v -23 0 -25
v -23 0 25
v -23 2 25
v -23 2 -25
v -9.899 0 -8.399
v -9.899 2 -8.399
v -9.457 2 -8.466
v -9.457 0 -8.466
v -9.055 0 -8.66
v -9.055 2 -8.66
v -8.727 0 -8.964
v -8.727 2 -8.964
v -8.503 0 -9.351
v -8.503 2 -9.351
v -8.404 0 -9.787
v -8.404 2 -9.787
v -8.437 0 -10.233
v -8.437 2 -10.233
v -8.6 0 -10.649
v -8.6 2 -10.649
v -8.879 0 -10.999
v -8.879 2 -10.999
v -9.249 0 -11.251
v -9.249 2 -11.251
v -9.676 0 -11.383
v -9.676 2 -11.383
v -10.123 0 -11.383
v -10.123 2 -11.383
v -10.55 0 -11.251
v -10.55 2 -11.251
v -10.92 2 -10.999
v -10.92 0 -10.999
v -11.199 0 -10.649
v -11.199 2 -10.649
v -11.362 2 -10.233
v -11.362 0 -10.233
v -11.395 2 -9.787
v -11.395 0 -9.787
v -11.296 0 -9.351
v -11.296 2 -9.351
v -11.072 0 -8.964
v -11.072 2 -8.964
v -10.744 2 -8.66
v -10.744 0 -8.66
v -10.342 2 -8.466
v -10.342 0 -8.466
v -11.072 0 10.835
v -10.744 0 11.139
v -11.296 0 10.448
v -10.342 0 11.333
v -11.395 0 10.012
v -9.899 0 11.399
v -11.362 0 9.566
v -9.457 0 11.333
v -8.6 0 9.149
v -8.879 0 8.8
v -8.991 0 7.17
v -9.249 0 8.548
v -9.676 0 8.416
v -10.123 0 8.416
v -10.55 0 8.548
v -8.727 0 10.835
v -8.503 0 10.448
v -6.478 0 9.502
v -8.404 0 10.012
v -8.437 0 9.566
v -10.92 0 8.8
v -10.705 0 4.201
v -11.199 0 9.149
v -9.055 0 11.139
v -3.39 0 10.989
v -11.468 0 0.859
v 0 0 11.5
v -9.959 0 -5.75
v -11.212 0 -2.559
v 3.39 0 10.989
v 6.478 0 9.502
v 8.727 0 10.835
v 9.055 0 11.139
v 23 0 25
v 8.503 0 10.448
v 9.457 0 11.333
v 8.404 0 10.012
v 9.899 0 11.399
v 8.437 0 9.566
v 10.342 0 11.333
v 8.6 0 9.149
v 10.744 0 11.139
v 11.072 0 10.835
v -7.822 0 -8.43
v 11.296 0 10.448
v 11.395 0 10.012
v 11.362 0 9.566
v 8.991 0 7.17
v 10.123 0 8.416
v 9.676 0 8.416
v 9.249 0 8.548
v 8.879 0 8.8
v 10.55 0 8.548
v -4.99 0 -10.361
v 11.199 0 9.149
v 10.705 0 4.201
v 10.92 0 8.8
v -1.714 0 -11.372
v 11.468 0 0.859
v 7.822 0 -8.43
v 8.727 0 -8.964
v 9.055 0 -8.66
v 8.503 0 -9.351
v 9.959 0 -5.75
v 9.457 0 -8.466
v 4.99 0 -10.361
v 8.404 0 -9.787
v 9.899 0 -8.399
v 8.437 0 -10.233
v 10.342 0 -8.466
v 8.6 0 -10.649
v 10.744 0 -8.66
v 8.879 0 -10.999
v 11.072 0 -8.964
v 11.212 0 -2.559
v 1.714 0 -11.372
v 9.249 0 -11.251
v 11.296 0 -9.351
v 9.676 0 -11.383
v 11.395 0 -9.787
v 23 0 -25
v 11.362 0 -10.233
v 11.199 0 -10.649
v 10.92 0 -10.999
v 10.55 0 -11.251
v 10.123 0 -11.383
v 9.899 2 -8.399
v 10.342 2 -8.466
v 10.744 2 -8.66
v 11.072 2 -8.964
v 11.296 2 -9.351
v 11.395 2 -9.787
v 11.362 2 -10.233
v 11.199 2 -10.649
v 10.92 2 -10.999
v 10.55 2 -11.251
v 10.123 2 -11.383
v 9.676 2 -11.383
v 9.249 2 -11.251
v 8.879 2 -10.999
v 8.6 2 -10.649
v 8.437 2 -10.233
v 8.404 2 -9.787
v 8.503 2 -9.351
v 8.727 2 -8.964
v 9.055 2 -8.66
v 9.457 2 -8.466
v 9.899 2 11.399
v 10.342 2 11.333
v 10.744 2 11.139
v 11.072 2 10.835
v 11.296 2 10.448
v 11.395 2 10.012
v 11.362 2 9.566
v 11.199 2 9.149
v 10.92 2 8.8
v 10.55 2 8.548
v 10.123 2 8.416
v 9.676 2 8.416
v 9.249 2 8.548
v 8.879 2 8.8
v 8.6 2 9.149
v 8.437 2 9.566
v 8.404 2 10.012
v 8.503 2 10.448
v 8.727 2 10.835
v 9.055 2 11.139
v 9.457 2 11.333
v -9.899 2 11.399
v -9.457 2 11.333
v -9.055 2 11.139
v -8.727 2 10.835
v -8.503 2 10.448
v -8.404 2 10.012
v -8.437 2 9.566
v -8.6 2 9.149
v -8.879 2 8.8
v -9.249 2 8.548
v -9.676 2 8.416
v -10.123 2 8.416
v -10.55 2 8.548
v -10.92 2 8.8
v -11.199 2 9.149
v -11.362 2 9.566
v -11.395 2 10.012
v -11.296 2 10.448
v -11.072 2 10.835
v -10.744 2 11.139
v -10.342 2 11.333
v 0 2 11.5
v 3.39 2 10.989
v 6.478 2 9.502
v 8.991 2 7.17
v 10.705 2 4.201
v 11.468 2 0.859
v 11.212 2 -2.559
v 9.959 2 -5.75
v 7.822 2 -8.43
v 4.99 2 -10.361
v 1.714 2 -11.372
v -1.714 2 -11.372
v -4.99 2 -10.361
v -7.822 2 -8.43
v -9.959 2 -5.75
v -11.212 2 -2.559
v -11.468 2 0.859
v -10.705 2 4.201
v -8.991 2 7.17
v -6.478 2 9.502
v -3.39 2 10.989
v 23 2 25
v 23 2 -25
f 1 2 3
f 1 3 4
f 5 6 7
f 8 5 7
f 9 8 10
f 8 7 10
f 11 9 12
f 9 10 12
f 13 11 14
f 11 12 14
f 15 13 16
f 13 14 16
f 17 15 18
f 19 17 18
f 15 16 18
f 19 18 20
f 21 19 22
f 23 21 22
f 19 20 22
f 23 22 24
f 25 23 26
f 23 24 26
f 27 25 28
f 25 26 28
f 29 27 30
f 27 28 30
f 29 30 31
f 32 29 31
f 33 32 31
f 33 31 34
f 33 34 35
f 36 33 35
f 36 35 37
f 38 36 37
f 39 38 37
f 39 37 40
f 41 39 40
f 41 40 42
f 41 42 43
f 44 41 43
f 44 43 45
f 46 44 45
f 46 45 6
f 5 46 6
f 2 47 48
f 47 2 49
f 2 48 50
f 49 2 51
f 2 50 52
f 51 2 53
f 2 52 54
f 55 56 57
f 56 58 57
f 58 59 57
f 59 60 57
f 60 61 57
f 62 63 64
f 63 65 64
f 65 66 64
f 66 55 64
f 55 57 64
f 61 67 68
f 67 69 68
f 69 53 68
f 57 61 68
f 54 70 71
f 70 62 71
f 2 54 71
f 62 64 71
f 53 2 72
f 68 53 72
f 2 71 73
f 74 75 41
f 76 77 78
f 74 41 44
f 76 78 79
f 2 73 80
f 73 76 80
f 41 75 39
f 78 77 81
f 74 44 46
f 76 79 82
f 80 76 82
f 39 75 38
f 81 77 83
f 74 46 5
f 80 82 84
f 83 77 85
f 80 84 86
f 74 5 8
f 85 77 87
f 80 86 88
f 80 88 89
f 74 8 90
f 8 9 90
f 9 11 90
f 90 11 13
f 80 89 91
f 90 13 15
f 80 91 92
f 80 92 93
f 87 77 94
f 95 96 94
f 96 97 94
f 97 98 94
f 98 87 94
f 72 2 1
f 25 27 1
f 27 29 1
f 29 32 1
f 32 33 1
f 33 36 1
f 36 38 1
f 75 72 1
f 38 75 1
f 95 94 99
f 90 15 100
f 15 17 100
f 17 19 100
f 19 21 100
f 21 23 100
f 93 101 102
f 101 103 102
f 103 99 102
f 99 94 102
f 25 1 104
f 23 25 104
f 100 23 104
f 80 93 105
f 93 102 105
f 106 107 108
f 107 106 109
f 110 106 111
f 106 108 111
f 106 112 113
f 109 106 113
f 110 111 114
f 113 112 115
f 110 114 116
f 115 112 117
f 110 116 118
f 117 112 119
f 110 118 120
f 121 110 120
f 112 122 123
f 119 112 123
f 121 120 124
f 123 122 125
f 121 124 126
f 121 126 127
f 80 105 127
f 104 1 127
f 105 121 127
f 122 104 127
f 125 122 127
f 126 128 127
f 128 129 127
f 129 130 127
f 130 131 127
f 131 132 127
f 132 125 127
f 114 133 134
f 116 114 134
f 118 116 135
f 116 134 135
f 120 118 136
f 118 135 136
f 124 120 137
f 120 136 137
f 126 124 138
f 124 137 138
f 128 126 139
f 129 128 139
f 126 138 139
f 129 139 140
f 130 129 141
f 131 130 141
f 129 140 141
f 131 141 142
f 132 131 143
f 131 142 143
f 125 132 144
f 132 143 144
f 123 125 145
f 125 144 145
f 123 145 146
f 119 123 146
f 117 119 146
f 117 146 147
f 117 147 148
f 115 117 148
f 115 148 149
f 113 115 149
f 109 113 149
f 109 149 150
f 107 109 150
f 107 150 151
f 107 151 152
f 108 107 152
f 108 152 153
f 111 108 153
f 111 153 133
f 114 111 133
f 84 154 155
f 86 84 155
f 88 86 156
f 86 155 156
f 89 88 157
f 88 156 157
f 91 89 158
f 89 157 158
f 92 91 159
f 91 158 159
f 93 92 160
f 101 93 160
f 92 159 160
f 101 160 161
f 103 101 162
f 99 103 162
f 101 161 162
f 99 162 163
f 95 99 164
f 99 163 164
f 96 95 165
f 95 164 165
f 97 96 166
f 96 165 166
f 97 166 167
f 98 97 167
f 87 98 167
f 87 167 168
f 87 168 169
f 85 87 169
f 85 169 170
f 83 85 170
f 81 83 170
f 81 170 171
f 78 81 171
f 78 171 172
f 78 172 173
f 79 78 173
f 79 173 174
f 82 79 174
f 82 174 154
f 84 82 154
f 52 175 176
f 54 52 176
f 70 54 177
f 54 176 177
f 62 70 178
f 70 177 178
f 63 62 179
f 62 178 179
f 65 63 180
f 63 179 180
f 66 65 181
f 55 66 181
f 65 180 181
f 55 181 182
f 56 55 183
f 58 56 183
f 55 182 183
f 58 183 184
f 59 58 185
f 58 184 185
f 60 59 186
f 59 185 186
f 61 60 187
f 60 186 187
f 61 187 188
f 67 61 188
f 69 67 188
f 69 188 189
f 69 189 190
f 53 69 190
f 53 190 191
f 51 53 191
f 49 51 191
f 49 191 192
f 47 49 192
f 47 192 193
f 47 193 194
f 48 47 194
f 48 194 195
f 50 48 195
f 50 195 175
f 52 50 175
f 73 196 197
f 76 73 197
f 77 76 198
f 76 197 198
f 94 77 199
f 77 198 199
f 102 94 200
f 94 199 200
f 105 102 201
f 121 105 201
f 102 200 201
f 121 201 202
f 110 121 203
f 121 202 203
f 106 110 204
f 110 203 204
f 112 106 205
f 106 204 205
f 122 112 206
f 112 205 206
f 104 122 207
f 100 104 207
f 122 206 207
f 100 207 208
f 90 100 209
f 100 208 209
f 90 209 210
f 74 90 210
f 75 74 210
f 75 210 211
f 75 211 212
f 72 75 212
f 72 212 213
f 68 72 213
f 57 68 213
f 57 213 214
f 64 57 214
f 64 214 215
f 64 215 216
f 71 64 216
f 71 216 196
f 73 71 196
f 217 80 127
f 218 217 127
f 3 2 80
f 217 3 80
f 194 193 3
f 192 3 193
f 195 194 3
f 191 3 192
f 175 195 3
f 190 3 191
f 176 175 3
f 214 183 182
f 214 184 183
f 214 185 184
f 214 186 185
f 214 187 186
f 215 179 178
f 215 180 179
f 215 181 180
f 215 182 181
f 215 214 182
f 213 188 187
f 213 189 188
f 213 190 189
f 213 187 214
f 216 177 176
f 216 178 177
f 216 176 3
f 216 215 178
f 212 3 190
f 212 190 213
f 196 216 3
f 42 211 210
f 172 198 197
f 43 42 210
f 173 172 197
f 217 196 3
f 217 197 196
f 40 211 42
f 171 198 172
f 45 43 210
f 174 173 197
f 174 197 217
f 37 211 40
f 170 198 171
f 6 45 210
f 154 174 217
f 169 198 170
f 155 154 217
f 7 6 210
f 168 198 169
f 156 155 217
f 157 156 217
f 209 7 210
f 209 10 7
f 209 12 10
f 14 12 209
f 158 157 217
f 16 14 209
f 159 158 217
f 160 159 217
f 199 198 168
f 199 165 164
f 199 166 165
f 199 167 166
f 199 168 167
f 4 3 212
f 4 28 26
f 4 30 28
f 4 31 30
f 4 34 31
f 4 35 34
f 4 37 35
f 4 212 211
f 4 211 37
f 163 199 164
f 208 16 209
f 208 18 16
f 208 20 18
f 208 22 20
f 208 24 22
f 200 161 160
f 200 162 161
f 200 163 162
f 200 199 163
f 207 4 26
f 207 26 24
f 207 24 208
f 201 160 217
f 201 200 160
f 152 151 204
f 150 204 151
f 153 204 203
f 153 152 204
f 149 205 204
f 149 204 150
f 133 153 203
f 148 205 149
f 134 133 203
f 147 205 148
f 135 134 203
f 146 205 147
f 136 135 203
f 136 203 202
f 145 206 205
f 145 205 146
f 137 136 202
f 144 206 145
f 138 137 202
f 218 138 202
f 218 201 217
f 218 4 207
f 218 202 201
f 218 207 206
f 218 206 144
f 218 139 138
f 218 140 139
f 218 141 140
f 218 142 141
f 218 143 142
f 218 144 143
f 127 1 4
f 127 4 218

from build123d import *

# Parameters (mm, degrees)
SKETCH1_W           = 46
SKETCH1_H           = 50
BOSS_EXTRUDE1_DEPTH = 2
SKETCH2_R           = 11.5
CUT_EXTRUDE2_DEPTH  = 35.029399054
SKETCH3_R           = 1.5
CUT_EXTRUDE3_DEPTH  = 35.029399054


with BuildPart() as part:
    # Sketch1 → Boss-Extrude1 (new body)
    with BuildSketch(Plane(origin=(0, 0, 0), x_dir=(1, 0, 0), z_dir=(0, 1, 0))):
        Rectangle(SKETCH1_W, SKETCH1_H)
    extrude(amount=BOSS_EXTRUDE1_DEPTH)

    # Sketch2 → Cut-Extrude2 (cut, through all)
    with BuildSketch(Plane(origin=(0, 2, 0), x_dir=(1, 0, 0), z_dir=(0, 1, 0))):
        with Locations(Location((0, 0, 0), (0, 0, 270))):
            Circle(SKETCH2_R)
    extrude(amount=-CUT_EXTRUDE2_DEPTH, mode=Mode.SUBTRACT)

    # Sketch3 → Cut-Extrude3 (cut, through all)
    with BuildSketch(Plane(origin=(0, 2, 0), x_dir=(1, 0, 0), z_dir=(0, 1, 0))):
        with Locations(Location((9.899494937, 9.899494937, 0), (0, 0, 270))):
            Circle(SKETCH3_R)
        with Locations(Location((-9.899494937, 9.899494937, 0), (0, 0, 270))):
            Circle(SKETCH3_R)
        with Locations(Location((-9.899494937, -9.899494937, 0), (0, 0, 270))):
            Circle(SKETCH3_R)
        with Locations(Location((9.899494937, -9.899494937, 0), (0, 0, 270))):
            Circle(SKETCH3_R)
    extrude(amount=-CUT_EXTRUDE3_DEPTH, mode=Mode.SUBTRACT)


solid = part.part
